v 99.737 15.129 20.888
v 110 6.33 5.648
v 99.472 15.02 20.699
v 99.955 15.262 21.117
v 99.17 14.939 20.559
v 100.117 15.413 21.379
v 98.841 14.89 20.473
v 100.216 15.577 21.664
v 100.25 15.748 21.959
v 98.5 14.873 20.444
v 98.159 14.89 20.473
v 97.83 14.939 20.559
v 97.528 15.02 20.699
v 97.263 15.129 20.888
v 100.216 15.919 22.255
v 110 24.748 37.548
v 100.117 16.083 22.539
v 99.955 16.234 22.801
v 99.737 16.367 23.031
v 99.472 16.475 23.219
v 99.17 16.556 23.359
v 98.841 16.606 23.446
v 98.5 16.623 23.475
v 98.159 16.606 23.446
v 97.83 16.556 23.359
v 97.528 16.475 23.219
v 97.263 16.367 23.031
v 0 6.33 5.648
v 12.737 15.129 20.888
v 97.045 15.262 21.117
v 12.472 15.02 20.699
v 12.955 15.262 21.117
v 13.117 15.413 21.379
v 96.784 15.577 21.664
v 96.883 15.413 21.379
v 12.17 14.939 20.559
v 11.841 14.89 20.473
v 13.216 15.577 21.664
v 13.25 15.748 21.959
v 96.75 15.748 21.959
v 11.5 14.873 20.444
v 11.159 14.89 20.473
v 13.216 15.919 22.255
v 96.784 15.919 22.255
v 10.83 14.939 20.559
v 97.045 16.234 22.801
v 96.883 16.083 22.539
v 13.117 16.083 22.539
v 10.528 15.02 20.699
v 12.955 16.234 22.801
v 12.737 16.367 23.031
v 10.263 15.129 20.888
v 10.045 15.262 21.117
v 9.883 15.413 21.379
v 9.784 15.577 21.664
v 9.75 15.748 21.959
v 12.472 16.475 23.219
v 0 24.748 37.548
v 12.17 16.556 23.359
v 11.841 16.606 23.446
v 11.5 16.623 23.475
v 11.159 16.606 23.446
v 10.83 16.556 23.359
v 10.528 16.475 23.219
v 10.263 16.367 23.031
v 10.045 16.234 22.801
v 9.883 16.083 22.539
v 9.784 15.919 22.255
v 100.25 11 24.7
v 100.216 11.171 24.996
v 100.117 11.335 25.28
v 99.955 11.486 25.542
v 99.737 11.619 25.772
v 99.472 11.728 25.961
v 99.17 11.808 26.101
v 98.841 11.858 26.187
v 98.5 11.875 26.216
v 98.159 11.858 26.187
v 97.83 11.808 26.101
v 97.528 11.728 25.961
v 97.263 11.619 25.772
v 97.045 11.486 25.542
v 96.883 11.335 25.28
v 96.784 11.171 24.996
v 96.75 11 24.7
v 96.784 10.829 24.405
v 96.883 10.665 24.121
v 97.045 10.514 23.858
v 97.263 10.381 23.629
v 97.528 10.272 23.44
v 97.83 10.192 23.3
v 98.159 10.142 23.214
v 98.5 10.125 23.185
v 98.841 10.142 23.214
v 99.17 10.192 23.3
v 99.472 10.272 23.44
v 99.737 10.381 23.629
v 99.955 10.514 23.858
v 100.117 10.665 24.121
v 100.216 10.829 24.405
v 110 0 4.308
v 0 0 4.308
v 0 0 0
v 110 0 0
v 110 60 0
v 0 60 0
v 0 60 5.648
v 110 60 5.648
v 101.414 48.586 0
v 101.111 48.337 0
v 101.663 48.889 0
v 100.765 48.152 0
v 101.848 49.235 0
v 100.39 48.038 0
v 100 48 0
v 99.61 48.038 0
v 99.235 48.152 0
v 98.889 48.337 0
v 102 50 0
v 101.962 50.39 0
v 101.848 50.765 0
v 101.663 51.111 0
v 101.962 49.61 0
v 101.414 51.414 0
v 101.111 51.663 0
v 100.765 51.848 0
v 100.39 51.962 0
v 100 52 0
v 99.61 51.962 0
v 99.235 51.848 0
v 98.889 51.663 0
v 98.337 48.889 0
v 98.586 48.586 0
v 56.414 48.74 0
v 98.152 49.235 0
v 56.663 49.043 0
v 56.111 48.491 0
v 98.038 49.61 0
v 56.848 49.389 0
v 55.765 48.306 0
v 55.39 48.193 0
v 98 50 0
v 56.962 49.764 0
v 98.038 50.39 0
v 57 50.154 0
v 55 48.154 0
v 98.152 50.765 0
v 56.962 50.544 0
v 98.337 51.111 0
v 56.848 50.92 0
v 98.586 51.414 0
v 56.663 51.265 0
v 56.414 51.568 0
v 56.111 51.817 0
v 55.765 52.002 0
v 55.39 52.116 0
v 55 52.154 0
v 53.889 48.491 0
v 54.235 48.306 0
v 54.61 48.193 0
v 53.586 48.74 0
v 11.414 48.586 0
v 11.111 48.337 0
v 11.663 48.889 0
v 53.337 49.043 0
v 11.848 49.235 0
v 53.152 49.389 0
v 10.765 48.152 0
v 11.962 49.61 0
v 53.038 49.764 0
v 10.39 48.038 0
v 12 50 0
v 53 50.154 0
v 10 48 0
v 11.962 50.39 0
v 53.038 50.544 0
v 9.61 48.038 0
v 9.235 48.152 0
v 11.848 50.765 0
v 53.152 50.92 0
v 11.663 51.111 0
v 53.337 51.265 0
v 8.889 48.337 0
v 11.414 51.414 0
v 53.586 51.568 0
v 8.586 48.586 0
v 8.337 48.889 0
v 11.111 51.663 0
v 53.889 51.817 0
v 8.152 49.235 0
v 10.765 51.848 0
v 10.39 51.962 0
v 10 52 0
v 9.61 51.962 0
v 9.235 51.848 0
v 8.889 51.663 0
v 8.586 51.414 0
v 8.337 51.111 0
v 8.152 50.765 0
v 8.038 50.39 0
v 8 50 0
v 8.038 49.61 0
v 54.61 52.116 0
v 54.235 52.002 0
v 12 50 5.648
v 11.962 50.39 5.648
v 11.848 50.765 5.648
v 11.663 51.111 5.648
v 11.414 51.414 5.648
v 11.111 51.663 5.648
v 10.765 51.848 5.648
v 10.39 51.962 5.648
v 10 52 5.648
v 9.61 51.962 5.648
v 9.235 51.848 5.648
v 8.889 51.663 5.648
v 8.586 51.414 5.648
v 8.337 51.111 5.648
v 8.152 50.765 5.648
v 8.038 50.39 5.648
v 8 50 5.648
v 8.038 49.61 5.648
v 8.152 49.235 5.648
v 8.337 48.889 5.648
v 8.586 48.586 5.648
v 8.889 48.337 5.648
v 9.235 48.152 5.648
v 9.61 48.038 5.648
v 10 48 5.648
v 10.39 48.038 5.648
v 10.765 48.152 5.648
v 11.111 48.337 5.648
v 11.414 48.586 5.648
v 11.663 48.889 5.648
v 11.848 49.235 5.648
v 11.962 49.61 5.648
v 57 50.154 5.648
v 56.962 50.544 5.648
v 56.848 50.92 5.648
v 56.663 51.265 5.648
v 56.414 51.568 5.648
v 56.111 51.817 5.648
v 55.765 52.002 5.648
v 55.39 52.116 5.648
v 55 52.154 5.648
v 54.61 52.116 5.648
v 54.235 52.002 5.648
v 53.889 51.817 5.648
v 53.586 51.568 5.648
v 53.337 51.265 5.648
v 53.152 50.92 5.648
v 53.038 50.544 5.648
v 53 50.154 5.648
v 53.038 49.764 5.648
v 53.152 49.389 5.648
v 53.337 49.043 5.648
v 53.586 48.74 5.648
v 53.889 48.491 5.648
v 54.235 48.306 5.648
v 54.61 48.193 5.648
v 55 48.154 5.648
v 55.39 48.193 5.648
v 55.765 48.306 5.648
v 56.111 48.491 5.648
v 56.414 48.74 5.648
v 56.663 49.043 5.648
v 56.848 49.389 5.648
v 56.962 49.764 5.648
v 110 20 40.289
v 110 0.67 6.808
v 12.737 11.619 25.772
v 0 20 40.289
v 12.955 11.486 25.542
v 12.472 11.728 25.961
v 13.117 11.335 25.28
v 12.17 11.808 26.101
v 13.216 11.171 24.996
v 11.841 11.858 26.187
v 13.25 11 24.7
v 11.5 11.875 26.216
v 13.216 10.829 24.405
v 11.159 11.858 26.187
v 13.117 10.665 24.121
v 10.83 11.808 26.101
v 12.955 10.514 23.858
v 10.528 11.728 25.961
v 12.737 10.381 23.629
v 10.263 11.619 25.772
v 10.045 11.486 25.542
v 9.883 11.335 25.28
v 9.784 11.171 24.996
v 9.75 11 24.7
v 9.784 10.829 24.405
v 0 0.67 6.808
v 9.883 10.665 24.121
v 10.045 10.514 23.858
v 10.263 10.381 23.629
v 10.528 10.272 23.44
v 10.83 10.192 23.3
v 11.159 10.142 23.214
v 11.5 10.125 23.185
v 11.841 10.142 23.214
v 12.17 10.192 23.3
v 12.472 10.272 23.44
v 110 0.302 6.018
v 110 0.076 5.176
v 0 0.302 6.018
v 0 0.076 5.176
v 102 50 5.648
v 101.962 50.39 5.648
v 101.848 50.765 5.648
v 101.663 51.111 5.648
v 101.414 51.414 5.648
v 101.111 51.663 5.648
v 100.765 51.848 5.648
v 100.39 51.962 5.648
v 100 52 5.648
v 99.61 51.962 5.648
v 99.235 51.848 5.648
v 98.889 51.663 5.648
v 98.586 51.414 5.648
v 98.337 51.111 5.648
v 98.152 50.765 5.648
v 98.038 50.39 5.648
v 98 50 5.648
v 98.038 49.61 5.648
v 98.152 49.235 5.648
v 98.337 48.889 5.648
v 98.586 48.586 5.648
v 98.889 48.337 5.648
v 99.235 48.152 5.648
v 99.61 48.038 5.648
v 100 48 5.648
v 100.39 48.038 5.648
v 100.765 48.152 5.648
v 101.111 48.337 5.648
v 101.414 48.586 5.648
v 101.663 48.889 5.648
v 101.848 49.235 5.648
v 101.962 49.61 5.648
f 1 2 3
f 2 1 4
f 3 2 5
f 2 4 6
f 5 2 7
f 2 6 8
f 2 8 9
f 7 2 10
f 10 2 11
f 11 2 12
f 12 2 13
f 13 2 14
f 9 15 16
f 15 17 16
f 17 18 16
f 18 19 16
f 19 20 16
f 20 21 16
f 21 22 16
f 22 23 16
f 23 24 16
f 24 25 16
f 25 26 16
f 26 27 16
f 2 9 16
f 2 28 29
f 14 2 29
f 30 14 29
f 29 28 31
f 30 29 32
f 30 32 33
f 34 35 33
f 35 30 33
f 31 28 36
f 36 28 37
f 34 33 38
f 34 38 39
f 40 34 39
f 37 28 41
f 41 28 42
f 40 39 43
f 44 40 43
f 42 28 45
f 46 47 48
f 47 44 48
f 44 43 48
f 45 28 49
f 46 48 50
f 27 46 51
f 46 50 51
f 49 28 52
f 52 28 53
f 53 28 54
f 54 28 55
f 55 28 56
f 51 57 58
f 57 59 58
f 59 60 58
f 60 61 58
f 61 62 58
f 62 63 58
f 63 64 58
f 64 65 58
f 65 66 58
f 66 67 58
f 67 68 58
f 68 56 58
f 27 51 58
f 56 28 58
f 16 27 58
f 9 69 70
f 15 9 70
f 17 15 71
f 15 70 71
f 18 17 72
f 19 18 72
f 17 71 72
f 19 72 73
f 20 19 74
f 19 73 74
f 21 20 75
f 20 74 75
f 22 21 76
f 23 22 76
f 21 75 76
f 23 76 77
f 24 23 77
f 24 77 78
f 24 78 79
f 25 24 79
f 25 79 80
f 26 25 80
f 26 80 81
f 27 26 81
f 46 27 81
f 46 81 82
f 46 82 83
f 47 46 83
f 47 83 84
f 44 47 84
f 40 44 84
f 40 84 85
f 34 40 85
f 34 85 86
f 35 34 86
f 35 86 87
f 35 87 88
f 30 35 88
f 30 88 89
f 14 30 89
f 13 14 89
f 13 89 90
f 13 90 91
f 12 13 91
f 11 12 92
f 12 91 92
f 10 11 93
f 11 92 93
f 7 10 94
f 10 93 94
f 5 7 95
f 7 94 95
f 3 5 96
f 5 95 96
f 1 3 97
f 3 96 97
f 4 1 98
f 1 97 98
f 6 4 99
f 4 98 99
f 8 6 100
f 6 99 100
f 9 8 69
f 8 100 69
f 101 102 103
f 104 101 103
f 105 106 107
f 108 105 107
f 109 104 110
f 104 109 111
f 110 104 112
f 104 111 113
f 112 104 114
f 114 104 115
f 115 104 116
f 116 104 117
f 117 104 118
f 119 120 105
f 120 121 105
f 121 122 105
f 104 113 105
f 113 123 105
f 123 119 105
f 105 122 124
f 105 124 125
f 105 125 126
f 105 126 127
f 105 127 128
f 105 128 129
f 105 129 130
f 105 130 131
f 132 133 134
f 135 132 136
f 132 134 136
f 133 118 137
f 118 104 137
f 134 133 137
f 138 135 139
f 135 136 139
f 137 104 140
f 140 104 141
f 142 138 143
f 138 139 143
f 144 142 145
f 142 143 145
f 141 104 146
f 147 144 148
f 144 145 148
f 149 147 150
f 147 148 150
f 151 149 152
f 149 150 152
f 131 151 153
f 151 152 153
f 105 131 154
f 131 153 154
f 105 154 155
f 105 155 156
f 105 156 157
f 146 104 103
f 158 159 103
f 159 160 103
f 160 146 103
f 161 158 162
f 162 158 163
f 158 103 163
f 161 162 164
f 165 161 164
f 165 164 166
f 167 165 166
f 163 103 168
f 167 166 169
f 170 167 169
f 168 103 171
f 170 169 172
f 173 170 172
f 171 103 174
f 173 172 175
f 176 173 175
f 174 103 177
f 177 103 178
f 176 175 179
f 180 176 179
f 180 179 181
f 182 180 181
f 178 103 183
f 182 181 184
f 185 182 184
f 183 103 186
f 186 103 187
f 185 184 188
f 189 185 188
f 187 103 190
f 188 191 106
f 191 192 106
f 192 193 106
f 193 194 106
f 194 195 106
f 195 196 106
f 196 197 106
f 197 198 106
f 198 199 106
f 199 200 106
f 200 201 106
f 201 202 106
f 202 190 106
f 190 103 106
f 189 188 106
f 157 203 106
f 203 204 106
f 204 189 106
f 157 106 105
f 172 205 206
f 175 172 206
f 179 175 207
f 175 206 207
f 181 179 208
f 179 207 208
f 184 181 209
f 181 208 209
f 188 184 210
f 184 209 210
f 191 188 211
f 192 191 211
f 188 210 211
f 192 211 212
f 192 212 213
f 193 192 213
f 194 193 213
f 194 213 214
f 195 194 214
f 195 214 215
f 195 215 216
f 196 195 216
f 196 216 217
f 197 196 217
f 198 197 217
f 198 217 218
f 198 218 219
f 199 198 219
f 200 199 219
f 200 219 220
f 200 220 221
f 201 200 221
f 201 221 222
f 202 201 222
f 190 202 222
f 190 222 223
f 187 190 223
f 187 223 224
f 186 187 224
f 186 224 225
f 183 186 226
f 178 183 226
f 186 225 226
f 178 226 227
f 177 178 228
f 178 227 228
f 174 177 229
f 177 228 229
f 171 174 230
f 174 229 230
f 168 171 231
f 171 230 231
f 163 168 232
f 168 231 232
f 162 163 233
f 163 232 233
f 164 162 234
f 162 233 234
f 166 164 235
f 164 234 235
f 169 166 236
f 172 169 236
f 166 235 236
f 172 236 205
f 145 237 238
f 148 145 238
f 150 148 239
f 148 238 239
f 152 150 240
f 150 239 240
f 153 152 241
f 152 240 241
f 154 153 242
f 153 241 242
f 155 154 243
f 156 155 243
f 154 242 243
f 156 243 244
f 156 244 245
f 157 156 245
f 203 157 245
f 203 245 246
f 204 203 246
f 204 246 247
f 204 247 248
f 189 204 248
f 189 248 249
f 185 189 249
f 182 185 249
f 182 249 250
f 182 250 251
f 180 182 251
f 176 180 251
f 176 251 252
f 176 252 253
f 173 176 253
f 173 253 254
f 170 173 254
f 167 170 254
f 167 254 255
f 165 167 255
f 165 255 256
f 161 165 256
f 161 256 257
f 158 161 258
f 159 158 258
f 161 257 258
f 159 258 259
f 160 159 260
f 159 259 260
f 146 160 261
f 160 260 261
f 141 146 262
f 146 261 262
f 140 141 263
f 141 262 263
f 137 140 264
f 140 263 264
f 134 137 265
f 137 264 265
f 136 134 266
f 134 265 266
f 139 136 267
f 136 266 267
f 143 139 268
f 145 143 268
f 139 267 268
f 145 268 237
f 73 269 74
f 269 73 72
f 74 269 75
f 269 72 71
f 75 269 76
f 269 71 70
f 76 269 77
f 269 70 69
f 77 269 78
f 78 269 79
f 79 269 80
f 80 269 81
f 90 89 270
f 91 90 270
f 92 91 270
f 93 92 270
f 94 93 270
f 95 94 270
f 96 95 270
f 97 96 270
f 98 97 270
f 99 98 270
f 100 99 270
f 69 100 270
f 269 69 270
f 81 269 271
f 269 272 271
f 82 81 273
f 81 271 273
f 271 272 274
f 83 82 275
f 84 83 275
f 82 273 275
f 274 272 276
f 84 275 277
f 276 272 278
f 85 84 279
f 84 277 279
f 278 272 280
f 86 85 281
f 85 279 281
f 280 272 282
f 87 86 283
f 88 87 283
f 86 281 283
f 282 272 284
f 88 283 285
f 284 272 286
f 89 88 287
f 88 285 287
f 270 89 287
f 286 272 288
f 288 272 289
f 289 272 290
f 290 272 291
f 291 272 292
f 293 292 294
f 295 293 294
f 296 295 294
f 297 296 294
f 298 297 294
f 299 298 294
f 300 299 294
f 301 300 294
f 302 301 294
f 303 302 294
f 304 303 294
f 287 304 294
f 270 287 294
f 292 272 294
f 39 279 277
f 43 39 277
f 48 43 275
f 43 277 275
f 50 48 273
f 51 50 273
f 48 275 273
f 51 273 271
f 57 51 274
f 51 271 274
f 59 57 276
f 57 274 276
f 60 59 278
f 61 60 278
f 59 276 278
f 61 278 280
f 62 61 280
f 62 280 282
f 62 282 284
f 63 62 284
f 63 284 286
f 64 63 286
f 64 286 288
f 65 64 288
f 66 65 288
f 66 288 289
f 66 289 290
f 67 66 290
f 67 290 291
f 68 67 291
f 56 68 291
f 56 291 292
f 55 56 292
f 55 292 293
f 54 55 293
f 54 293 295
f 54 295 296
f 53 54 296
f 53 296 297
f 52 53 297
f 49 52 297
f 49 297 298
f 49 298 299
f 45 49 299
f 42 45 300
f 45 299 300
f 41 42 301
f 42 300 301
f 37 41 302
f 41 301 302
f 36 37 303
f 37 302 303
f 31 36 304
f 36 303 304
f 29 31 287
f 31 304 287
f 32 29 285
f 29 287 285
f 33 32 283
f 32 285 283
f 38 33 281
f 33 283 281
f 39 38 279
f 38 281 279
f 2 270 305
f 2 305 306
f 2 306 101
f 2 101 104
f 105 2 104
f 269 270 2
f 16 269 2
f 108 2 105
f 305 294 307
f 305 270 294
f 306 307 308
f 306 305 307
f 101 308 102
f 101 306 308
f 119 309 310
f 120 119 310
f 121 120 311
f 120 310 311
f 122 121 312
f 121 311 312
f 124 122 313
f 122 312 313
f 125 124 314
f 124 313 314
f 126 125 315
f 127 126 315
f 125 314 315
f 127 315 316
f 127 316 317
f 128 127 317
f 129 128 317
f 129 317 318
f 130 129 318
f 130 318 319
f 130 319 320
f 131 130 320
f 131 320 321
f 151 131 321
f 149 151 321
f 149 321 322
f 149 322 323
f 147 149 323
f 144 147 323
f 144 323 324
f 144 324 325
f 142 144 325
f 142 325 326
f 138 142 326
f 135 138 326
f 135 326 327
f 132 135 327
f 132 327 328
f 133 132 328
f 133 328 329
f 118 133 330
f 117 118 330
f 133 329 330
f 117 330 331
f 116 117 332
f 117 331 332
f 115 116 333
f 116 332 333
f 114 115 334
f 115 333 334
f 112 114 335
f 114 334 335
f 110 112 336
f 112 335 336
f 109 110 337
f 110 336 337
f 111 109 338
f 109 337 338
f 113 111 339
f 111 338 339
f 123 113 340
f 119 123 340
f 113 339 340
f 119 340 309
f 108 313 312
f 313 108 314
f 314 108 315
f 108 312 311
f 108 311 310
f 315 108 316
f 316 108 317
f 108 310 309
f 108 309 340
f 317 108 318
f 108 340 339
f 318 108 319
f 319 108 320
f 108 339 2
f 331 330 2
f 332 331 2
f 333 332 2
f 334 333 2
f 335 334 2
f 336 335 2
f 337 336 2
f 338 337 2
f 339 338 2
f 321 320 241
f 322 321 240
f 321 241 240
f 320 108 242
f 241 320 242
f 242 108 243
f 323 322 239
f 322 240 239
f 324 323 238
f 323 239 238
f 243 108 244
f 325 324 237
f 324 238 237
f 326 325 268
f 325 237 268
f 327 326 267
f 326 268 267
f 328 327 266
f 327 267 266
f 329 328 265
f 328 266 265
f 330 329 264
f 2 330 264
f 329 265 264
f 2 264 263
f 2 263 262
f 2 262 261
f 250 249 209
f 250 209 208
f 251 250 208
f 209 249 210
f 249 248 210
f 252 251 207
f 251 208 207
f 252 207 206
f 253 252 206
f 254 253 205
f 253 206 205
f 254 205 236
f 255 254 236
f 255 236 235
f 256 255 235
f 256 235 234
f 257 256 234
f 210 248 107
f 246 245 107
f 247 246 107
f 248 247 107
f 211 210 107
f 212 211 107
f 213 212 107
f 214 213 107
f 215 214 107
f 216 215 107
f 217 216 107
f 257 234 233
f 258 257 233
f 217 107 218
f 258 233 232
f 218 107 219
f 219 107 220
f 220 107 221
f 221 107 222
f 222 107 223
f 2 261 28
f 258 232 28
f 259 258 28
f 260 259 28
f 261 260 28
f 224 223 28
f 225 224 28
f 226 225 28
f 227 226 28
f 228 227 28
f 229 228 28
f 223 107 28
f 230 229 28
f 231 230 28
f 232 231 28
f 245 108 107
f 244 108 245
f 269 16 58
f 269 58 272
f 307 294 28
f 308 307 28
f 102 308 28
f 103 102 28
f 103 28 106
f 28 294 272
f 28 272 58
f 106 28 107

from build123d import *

# Parameters (mm, degrees)
F1_DEPTH = 110
F2_R     = 1.75
F3_DEPTH = 8
F4_R     = 2
F5_DEPTH = 10
F6_R     = 5


with BuildPart() as f1:
    # F0 (on Right) → F1 (new body)
    with BuildSketch(Plane.YZ):
        Polygon((60, 5.6479252494), (6.3304924375, 5.6479252494), (24.7478693281, 37.5477577661), (20, 40.2889414007), (0, 5.6479252494), (0, 0), (60, 0), align=None)
    extrude(amount=F1_DEPTH)

    # F2 (on face) → F3 (cut)
    with BuildSketch(Plane(origin=(0, -2.4456233723, 1.4119813123), x_dir=(1, 0, 0), z_dir=(0, -0.8660254038, 0.5))):
        with Locations((11.5, 26.8912467446)):
            Circle(F2_R)
        with Locations((98.5, 26.8912467446)):
            Circle(F2_R)
    extrude(amount=-F3_DEPTH, mode=Mode.SUBTRACT)

    # F4 (on face) → F5 (cut)
    with BuildSketch(Plane.XY.offset(5.6479252494)):
        with Locations((100, 50)):
            Circle(F4_R)
        with Locations((55, 50.1541644335)):
            Circle(F4_R)
        with Locations((10, 50)):
            Circle(F4_R)
    extrude(amount=-F5_DEPTH, mode=Mode.SUBTRACT)

    # F6
    f6_edges = [f1.edges().sort_by_distance(p)[0] for p in [
        (55, 0, 5.647925),
    ]]
    fillet(f6_edges, radius=F6_R)


solid = f1.part
